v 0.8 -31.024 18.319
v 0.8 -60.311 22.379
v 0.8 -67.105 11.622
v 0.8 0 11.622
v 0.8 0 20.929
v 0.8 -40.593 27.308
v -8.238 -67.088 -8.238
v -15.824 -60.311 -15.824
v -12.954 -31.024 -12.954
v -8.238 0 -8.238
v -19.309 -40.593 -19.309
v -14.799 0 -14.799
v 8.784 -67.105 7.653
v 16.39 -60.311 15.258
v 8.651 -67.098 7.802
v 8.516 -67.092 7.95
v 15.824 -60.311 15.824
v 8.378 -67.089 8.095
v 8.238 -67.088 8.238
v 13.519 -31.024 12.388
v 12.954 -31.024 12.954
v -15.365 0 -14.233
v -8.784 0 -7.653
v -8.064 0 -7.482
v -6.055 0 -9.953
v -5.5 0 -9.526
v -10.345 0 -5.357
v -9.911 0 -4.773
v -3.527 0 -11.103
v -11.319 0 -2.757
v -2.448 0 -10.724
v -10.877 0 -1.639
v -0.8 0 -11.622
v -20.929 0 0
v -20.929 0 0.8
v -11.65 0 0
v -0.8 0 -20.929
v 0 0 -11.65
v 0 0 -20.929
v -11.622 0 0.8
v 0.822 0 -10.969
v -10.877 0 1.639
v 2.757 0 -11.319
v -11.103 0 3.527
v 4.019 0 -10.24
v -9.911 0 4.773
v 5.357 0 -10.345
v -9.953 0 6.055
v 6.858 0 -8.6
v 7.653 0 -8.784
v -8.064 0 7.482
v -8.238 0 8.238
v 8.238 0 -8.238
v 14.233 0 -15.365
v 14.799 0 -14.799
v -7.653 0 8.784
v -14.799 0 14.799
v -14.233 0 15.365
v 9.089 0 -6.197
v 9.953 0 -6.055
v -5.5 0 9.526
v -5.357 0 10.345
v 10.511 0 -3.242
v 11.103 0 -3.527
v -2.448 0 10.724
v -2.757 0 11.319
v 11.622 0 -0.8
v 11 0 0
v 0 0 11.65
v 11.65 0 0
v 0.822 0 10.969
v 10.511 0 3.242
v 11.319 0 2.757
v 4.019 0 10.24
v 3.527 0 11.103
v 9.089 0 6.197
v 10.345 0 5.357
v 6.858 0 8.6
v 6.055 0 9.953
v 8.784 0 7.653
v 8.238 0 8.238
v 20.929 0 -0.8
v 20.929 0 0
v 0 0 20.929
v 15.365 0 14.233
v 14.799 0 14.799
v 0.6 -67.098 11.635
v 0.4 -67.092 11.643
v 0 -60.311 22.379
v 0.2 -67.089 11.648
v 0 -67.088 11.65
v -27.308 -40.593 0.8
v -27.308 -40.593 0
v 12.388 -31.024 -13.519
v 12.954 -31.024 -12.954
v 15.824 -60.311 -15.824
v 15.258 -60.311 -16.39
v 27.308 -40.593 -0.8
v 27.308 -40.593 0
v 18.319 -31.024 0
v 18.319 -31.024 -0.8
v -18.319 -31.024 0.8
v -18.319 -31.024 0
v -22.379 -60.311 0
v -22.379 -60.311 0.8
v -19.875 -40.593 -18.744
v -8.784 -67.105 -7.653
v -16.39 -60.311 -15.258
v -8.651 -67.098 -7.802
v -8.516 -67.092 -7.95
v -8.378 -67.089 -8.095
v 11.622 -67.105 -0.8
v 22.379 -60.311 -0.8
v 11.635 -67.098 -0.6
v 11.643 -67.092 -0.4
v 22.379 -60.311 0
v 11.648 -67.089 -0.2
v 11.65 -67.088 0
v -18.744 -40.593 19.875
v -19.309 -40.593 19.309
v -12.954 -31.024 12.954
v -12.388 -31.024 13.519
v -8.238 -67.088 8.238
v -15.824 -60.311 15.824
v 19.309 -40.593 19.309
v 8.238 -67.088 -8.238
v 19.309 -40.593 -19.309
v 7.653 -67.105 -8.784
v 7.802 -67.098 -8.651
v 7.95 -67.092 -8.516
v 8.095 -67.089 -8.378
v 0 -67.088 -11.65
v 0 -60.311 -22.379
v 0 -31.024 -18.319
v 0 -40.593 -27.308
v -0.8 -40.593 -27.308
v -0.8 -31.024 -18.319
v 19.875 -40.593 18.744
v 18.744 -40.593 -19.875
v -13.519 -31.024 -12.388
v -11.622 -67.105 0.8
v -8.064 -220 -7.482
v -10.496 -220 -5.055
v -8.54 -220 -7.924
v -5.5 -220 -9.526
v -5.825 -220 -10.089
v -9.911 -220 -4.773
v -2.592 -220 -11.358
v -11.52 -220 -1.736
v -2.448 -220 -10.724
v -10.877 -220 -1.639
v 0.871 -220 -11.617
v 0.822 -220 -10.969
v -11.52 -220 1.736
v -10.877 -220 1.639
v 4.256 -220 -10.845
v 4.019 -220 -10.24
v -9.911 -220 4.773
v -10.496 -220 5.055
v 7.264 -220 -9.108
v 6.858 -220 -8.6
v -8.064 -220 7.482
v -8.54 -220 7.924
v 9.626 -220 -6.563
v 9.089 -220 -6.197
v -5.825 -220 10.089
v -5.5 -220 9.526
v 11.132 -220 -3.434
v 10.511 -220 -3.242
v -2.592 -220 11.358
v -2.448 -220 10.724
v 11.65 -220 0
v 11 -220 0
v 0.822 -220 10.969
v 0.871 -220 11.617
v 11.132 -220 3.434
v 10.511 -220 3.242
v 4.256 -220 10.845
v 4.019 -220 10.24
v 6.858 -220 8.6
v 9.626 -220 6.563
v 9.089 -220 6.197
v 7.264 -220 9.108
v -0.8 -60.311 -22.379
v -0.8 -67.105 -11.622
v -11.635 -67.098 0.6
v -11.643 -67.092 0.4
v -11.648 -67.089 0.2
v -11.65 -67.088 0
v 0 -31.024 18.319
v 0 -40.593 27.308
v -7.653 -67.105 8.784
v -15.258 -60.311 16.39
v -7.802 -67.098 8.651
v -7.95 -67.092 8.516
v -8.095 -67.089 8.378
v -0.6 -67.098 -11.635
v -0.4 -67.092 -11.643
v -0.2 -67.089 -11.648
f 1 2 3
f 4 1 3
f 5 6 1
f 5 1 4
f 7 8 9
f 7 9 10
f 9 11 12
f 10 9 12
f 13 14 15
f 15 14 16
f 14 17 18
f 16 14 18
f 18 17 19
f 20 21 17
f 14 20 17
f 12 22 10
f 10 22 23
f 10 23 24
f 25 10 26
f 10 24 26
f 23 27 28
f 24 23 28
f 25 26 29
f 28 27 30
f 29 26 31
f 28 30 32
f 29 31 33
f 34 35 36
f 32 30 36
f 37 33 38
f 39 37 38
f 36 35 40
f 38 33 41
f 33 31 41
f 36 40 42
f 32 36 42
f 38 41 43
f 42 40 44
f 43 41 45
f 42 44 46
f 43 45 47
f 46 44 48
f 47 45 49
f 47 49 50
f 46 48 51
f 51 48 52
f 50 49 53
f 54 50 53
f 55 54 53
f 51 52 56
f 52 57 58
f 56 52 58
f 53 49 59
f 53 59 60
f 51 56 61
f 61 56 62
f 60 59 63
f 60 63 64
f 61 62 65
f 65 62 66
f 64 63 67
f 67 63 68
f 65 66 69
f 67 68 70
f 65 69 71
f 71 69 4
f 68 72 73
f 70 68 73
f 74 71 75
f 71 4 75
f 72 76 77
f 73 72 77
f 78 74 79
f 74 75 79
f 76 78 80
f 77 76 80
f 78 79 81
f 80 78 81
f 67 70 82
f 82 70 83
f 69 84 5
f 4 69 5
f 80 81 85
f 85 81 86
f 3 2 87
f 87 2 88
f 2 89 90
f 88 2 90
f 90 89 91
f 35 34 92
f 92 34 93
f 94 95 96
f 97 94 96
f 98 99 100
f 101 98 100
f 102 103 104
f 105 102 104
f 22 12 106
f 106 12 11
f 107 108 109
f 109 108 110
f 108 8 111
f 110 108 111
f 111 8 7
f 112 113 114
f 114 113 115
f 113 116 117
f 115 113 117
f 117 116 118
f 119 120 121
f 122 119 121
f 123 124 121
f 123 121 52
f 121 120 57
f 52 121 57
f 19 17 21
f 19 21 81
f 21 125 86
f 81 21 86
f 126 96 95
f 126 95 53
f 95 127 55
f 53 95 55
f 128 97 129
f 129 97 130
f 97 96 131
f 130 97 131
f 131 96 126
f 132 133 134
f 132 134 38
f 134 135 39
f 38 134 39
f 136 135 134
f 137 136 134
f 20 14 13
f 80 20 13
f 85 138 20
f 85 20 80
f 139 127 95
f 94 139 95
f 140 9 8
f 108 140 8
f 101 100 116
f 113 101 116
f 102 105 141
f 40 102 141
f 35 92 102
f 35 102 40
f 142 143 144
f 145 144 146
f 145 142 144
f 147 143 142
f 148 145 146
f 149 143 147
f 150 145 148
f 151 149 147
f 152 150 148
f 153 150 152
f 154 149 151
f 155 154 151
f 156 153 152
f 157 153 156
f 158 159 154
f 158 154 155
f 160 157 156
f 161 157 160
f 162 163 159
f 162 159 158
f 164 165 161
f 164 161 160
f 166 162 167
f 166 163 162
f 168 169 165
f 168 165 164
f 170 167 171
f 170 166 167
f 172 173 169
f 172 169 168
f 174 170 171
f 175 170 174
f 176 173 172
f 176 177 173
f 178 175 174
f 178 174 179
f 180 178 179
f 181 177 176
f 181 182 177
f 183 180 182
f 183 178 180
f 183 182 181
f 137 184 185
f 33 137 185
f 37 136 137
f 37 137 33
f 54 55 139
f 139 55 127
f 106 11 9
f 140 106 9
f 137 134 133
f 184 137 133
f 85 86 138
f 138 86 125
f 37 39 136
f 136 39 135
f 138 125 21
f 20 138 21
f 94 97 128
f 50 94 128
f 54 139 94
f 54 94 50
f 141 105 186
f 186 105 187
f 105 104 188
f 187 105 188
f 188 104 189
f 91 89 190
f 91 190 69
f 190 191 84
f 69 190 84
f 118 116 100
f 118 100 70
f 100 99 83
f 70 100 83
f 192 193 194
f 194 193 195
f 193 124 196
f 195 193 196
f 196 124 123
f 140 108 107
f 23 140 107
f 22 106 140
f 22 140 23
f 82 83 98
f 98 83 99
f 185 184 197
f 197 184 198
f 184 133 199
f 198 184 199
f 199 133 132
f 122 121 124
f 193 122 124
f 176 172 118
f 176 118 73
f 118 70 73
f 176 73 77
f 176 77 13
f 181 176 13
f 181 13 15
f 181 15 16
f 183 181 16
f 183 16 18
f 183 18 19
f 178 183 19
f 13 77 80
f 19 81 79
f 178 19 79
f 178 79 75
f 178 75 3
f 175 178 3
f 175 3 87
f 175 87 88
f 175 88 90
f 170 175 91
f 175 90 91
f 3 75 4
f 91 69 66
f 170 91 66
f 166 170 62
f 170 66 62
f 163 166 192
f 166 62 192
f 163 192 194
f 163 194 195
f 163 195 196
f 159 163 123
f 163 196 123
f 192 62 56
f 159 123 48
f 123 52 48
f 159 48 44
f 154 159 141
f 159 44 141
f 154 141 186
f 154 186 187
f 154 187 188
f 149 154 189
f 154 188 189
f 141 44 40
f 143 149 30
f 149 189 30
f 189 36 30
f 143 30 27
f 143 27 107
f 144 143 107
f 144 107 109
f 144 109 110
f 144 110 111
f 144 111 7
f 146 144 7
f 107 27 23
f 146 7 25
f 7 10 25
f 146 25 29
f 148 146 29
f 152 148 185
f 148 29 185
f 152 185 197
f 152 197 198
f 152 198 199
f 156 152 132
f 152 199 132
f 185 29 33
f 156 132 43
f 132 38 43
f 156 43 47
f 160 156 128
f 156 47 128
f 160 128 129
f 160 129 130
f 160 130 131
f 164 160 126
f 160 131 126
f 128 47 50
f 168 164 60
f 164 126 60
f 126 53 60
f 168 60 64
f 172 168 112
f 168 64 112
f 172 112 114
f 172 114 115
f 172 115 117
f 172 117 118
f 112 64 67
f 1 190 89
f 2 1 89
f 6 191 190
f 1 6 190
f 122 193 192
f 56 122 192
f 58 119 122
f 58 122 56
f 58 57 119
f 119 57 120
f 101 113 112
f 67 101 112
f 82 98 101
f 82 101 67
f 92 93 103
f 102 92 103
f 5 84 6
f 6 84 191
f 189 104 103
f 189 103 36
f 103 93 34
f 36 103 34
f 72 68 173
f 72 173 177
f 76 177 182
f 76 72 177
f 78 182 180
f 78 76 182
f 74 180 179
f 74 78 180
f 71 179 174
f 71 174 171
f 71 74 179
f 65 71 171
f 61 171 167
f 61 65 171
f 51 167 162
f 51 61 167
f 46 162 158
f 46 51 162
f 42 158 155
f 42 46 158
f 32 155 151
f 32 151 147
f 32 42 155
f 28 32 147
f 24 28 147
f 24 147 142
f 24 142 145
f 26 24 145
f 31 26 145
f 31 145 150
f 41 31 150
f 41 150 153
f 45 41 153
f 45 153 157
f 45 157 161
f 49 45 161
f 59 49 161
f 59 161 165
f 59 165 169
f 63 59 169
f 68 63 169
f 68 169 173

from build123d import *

# Parameters (mm, degrees)
F0_R     = 11.65
F0_R_2   = 11
F1_DEPTH = 220
F3_DEPTH = 0.8
F4_COUNT = 8


with BuildPart() as f1:
    # F0 (on Front) → F1 (new body)
    with BuildSketch(Plane.XZ):
        Circle(F0_R)
        Circle(F0_R_2, mode=Mode.SUBTRACT)
    extrude(amount=F1_DEPTH)

    # F2 (on Right) → F3 (join)
    with BuildSketch(Plane.YZ):
        Polygon((-67.270614, 11.36047), (0, 11.36047), (0, 20.928832), (-40.592879, 27.307741), (-31.023696, 18.319281), (-60.311206, 22.378588), align=None)
    extrude(amount=F3_DEPTH)

    # F4: F1 ×8 about axis
    f4_axis = Axis((0, 0, 0), (0, -1, 0))


with BuildPart() as f1_1:
    add(f1.part)
    for i in range(1, F4_COUNT):
        add(f1.part.rotate(f4_axis, i * 360 / F4_COUNT))


solid = f1_1.part
